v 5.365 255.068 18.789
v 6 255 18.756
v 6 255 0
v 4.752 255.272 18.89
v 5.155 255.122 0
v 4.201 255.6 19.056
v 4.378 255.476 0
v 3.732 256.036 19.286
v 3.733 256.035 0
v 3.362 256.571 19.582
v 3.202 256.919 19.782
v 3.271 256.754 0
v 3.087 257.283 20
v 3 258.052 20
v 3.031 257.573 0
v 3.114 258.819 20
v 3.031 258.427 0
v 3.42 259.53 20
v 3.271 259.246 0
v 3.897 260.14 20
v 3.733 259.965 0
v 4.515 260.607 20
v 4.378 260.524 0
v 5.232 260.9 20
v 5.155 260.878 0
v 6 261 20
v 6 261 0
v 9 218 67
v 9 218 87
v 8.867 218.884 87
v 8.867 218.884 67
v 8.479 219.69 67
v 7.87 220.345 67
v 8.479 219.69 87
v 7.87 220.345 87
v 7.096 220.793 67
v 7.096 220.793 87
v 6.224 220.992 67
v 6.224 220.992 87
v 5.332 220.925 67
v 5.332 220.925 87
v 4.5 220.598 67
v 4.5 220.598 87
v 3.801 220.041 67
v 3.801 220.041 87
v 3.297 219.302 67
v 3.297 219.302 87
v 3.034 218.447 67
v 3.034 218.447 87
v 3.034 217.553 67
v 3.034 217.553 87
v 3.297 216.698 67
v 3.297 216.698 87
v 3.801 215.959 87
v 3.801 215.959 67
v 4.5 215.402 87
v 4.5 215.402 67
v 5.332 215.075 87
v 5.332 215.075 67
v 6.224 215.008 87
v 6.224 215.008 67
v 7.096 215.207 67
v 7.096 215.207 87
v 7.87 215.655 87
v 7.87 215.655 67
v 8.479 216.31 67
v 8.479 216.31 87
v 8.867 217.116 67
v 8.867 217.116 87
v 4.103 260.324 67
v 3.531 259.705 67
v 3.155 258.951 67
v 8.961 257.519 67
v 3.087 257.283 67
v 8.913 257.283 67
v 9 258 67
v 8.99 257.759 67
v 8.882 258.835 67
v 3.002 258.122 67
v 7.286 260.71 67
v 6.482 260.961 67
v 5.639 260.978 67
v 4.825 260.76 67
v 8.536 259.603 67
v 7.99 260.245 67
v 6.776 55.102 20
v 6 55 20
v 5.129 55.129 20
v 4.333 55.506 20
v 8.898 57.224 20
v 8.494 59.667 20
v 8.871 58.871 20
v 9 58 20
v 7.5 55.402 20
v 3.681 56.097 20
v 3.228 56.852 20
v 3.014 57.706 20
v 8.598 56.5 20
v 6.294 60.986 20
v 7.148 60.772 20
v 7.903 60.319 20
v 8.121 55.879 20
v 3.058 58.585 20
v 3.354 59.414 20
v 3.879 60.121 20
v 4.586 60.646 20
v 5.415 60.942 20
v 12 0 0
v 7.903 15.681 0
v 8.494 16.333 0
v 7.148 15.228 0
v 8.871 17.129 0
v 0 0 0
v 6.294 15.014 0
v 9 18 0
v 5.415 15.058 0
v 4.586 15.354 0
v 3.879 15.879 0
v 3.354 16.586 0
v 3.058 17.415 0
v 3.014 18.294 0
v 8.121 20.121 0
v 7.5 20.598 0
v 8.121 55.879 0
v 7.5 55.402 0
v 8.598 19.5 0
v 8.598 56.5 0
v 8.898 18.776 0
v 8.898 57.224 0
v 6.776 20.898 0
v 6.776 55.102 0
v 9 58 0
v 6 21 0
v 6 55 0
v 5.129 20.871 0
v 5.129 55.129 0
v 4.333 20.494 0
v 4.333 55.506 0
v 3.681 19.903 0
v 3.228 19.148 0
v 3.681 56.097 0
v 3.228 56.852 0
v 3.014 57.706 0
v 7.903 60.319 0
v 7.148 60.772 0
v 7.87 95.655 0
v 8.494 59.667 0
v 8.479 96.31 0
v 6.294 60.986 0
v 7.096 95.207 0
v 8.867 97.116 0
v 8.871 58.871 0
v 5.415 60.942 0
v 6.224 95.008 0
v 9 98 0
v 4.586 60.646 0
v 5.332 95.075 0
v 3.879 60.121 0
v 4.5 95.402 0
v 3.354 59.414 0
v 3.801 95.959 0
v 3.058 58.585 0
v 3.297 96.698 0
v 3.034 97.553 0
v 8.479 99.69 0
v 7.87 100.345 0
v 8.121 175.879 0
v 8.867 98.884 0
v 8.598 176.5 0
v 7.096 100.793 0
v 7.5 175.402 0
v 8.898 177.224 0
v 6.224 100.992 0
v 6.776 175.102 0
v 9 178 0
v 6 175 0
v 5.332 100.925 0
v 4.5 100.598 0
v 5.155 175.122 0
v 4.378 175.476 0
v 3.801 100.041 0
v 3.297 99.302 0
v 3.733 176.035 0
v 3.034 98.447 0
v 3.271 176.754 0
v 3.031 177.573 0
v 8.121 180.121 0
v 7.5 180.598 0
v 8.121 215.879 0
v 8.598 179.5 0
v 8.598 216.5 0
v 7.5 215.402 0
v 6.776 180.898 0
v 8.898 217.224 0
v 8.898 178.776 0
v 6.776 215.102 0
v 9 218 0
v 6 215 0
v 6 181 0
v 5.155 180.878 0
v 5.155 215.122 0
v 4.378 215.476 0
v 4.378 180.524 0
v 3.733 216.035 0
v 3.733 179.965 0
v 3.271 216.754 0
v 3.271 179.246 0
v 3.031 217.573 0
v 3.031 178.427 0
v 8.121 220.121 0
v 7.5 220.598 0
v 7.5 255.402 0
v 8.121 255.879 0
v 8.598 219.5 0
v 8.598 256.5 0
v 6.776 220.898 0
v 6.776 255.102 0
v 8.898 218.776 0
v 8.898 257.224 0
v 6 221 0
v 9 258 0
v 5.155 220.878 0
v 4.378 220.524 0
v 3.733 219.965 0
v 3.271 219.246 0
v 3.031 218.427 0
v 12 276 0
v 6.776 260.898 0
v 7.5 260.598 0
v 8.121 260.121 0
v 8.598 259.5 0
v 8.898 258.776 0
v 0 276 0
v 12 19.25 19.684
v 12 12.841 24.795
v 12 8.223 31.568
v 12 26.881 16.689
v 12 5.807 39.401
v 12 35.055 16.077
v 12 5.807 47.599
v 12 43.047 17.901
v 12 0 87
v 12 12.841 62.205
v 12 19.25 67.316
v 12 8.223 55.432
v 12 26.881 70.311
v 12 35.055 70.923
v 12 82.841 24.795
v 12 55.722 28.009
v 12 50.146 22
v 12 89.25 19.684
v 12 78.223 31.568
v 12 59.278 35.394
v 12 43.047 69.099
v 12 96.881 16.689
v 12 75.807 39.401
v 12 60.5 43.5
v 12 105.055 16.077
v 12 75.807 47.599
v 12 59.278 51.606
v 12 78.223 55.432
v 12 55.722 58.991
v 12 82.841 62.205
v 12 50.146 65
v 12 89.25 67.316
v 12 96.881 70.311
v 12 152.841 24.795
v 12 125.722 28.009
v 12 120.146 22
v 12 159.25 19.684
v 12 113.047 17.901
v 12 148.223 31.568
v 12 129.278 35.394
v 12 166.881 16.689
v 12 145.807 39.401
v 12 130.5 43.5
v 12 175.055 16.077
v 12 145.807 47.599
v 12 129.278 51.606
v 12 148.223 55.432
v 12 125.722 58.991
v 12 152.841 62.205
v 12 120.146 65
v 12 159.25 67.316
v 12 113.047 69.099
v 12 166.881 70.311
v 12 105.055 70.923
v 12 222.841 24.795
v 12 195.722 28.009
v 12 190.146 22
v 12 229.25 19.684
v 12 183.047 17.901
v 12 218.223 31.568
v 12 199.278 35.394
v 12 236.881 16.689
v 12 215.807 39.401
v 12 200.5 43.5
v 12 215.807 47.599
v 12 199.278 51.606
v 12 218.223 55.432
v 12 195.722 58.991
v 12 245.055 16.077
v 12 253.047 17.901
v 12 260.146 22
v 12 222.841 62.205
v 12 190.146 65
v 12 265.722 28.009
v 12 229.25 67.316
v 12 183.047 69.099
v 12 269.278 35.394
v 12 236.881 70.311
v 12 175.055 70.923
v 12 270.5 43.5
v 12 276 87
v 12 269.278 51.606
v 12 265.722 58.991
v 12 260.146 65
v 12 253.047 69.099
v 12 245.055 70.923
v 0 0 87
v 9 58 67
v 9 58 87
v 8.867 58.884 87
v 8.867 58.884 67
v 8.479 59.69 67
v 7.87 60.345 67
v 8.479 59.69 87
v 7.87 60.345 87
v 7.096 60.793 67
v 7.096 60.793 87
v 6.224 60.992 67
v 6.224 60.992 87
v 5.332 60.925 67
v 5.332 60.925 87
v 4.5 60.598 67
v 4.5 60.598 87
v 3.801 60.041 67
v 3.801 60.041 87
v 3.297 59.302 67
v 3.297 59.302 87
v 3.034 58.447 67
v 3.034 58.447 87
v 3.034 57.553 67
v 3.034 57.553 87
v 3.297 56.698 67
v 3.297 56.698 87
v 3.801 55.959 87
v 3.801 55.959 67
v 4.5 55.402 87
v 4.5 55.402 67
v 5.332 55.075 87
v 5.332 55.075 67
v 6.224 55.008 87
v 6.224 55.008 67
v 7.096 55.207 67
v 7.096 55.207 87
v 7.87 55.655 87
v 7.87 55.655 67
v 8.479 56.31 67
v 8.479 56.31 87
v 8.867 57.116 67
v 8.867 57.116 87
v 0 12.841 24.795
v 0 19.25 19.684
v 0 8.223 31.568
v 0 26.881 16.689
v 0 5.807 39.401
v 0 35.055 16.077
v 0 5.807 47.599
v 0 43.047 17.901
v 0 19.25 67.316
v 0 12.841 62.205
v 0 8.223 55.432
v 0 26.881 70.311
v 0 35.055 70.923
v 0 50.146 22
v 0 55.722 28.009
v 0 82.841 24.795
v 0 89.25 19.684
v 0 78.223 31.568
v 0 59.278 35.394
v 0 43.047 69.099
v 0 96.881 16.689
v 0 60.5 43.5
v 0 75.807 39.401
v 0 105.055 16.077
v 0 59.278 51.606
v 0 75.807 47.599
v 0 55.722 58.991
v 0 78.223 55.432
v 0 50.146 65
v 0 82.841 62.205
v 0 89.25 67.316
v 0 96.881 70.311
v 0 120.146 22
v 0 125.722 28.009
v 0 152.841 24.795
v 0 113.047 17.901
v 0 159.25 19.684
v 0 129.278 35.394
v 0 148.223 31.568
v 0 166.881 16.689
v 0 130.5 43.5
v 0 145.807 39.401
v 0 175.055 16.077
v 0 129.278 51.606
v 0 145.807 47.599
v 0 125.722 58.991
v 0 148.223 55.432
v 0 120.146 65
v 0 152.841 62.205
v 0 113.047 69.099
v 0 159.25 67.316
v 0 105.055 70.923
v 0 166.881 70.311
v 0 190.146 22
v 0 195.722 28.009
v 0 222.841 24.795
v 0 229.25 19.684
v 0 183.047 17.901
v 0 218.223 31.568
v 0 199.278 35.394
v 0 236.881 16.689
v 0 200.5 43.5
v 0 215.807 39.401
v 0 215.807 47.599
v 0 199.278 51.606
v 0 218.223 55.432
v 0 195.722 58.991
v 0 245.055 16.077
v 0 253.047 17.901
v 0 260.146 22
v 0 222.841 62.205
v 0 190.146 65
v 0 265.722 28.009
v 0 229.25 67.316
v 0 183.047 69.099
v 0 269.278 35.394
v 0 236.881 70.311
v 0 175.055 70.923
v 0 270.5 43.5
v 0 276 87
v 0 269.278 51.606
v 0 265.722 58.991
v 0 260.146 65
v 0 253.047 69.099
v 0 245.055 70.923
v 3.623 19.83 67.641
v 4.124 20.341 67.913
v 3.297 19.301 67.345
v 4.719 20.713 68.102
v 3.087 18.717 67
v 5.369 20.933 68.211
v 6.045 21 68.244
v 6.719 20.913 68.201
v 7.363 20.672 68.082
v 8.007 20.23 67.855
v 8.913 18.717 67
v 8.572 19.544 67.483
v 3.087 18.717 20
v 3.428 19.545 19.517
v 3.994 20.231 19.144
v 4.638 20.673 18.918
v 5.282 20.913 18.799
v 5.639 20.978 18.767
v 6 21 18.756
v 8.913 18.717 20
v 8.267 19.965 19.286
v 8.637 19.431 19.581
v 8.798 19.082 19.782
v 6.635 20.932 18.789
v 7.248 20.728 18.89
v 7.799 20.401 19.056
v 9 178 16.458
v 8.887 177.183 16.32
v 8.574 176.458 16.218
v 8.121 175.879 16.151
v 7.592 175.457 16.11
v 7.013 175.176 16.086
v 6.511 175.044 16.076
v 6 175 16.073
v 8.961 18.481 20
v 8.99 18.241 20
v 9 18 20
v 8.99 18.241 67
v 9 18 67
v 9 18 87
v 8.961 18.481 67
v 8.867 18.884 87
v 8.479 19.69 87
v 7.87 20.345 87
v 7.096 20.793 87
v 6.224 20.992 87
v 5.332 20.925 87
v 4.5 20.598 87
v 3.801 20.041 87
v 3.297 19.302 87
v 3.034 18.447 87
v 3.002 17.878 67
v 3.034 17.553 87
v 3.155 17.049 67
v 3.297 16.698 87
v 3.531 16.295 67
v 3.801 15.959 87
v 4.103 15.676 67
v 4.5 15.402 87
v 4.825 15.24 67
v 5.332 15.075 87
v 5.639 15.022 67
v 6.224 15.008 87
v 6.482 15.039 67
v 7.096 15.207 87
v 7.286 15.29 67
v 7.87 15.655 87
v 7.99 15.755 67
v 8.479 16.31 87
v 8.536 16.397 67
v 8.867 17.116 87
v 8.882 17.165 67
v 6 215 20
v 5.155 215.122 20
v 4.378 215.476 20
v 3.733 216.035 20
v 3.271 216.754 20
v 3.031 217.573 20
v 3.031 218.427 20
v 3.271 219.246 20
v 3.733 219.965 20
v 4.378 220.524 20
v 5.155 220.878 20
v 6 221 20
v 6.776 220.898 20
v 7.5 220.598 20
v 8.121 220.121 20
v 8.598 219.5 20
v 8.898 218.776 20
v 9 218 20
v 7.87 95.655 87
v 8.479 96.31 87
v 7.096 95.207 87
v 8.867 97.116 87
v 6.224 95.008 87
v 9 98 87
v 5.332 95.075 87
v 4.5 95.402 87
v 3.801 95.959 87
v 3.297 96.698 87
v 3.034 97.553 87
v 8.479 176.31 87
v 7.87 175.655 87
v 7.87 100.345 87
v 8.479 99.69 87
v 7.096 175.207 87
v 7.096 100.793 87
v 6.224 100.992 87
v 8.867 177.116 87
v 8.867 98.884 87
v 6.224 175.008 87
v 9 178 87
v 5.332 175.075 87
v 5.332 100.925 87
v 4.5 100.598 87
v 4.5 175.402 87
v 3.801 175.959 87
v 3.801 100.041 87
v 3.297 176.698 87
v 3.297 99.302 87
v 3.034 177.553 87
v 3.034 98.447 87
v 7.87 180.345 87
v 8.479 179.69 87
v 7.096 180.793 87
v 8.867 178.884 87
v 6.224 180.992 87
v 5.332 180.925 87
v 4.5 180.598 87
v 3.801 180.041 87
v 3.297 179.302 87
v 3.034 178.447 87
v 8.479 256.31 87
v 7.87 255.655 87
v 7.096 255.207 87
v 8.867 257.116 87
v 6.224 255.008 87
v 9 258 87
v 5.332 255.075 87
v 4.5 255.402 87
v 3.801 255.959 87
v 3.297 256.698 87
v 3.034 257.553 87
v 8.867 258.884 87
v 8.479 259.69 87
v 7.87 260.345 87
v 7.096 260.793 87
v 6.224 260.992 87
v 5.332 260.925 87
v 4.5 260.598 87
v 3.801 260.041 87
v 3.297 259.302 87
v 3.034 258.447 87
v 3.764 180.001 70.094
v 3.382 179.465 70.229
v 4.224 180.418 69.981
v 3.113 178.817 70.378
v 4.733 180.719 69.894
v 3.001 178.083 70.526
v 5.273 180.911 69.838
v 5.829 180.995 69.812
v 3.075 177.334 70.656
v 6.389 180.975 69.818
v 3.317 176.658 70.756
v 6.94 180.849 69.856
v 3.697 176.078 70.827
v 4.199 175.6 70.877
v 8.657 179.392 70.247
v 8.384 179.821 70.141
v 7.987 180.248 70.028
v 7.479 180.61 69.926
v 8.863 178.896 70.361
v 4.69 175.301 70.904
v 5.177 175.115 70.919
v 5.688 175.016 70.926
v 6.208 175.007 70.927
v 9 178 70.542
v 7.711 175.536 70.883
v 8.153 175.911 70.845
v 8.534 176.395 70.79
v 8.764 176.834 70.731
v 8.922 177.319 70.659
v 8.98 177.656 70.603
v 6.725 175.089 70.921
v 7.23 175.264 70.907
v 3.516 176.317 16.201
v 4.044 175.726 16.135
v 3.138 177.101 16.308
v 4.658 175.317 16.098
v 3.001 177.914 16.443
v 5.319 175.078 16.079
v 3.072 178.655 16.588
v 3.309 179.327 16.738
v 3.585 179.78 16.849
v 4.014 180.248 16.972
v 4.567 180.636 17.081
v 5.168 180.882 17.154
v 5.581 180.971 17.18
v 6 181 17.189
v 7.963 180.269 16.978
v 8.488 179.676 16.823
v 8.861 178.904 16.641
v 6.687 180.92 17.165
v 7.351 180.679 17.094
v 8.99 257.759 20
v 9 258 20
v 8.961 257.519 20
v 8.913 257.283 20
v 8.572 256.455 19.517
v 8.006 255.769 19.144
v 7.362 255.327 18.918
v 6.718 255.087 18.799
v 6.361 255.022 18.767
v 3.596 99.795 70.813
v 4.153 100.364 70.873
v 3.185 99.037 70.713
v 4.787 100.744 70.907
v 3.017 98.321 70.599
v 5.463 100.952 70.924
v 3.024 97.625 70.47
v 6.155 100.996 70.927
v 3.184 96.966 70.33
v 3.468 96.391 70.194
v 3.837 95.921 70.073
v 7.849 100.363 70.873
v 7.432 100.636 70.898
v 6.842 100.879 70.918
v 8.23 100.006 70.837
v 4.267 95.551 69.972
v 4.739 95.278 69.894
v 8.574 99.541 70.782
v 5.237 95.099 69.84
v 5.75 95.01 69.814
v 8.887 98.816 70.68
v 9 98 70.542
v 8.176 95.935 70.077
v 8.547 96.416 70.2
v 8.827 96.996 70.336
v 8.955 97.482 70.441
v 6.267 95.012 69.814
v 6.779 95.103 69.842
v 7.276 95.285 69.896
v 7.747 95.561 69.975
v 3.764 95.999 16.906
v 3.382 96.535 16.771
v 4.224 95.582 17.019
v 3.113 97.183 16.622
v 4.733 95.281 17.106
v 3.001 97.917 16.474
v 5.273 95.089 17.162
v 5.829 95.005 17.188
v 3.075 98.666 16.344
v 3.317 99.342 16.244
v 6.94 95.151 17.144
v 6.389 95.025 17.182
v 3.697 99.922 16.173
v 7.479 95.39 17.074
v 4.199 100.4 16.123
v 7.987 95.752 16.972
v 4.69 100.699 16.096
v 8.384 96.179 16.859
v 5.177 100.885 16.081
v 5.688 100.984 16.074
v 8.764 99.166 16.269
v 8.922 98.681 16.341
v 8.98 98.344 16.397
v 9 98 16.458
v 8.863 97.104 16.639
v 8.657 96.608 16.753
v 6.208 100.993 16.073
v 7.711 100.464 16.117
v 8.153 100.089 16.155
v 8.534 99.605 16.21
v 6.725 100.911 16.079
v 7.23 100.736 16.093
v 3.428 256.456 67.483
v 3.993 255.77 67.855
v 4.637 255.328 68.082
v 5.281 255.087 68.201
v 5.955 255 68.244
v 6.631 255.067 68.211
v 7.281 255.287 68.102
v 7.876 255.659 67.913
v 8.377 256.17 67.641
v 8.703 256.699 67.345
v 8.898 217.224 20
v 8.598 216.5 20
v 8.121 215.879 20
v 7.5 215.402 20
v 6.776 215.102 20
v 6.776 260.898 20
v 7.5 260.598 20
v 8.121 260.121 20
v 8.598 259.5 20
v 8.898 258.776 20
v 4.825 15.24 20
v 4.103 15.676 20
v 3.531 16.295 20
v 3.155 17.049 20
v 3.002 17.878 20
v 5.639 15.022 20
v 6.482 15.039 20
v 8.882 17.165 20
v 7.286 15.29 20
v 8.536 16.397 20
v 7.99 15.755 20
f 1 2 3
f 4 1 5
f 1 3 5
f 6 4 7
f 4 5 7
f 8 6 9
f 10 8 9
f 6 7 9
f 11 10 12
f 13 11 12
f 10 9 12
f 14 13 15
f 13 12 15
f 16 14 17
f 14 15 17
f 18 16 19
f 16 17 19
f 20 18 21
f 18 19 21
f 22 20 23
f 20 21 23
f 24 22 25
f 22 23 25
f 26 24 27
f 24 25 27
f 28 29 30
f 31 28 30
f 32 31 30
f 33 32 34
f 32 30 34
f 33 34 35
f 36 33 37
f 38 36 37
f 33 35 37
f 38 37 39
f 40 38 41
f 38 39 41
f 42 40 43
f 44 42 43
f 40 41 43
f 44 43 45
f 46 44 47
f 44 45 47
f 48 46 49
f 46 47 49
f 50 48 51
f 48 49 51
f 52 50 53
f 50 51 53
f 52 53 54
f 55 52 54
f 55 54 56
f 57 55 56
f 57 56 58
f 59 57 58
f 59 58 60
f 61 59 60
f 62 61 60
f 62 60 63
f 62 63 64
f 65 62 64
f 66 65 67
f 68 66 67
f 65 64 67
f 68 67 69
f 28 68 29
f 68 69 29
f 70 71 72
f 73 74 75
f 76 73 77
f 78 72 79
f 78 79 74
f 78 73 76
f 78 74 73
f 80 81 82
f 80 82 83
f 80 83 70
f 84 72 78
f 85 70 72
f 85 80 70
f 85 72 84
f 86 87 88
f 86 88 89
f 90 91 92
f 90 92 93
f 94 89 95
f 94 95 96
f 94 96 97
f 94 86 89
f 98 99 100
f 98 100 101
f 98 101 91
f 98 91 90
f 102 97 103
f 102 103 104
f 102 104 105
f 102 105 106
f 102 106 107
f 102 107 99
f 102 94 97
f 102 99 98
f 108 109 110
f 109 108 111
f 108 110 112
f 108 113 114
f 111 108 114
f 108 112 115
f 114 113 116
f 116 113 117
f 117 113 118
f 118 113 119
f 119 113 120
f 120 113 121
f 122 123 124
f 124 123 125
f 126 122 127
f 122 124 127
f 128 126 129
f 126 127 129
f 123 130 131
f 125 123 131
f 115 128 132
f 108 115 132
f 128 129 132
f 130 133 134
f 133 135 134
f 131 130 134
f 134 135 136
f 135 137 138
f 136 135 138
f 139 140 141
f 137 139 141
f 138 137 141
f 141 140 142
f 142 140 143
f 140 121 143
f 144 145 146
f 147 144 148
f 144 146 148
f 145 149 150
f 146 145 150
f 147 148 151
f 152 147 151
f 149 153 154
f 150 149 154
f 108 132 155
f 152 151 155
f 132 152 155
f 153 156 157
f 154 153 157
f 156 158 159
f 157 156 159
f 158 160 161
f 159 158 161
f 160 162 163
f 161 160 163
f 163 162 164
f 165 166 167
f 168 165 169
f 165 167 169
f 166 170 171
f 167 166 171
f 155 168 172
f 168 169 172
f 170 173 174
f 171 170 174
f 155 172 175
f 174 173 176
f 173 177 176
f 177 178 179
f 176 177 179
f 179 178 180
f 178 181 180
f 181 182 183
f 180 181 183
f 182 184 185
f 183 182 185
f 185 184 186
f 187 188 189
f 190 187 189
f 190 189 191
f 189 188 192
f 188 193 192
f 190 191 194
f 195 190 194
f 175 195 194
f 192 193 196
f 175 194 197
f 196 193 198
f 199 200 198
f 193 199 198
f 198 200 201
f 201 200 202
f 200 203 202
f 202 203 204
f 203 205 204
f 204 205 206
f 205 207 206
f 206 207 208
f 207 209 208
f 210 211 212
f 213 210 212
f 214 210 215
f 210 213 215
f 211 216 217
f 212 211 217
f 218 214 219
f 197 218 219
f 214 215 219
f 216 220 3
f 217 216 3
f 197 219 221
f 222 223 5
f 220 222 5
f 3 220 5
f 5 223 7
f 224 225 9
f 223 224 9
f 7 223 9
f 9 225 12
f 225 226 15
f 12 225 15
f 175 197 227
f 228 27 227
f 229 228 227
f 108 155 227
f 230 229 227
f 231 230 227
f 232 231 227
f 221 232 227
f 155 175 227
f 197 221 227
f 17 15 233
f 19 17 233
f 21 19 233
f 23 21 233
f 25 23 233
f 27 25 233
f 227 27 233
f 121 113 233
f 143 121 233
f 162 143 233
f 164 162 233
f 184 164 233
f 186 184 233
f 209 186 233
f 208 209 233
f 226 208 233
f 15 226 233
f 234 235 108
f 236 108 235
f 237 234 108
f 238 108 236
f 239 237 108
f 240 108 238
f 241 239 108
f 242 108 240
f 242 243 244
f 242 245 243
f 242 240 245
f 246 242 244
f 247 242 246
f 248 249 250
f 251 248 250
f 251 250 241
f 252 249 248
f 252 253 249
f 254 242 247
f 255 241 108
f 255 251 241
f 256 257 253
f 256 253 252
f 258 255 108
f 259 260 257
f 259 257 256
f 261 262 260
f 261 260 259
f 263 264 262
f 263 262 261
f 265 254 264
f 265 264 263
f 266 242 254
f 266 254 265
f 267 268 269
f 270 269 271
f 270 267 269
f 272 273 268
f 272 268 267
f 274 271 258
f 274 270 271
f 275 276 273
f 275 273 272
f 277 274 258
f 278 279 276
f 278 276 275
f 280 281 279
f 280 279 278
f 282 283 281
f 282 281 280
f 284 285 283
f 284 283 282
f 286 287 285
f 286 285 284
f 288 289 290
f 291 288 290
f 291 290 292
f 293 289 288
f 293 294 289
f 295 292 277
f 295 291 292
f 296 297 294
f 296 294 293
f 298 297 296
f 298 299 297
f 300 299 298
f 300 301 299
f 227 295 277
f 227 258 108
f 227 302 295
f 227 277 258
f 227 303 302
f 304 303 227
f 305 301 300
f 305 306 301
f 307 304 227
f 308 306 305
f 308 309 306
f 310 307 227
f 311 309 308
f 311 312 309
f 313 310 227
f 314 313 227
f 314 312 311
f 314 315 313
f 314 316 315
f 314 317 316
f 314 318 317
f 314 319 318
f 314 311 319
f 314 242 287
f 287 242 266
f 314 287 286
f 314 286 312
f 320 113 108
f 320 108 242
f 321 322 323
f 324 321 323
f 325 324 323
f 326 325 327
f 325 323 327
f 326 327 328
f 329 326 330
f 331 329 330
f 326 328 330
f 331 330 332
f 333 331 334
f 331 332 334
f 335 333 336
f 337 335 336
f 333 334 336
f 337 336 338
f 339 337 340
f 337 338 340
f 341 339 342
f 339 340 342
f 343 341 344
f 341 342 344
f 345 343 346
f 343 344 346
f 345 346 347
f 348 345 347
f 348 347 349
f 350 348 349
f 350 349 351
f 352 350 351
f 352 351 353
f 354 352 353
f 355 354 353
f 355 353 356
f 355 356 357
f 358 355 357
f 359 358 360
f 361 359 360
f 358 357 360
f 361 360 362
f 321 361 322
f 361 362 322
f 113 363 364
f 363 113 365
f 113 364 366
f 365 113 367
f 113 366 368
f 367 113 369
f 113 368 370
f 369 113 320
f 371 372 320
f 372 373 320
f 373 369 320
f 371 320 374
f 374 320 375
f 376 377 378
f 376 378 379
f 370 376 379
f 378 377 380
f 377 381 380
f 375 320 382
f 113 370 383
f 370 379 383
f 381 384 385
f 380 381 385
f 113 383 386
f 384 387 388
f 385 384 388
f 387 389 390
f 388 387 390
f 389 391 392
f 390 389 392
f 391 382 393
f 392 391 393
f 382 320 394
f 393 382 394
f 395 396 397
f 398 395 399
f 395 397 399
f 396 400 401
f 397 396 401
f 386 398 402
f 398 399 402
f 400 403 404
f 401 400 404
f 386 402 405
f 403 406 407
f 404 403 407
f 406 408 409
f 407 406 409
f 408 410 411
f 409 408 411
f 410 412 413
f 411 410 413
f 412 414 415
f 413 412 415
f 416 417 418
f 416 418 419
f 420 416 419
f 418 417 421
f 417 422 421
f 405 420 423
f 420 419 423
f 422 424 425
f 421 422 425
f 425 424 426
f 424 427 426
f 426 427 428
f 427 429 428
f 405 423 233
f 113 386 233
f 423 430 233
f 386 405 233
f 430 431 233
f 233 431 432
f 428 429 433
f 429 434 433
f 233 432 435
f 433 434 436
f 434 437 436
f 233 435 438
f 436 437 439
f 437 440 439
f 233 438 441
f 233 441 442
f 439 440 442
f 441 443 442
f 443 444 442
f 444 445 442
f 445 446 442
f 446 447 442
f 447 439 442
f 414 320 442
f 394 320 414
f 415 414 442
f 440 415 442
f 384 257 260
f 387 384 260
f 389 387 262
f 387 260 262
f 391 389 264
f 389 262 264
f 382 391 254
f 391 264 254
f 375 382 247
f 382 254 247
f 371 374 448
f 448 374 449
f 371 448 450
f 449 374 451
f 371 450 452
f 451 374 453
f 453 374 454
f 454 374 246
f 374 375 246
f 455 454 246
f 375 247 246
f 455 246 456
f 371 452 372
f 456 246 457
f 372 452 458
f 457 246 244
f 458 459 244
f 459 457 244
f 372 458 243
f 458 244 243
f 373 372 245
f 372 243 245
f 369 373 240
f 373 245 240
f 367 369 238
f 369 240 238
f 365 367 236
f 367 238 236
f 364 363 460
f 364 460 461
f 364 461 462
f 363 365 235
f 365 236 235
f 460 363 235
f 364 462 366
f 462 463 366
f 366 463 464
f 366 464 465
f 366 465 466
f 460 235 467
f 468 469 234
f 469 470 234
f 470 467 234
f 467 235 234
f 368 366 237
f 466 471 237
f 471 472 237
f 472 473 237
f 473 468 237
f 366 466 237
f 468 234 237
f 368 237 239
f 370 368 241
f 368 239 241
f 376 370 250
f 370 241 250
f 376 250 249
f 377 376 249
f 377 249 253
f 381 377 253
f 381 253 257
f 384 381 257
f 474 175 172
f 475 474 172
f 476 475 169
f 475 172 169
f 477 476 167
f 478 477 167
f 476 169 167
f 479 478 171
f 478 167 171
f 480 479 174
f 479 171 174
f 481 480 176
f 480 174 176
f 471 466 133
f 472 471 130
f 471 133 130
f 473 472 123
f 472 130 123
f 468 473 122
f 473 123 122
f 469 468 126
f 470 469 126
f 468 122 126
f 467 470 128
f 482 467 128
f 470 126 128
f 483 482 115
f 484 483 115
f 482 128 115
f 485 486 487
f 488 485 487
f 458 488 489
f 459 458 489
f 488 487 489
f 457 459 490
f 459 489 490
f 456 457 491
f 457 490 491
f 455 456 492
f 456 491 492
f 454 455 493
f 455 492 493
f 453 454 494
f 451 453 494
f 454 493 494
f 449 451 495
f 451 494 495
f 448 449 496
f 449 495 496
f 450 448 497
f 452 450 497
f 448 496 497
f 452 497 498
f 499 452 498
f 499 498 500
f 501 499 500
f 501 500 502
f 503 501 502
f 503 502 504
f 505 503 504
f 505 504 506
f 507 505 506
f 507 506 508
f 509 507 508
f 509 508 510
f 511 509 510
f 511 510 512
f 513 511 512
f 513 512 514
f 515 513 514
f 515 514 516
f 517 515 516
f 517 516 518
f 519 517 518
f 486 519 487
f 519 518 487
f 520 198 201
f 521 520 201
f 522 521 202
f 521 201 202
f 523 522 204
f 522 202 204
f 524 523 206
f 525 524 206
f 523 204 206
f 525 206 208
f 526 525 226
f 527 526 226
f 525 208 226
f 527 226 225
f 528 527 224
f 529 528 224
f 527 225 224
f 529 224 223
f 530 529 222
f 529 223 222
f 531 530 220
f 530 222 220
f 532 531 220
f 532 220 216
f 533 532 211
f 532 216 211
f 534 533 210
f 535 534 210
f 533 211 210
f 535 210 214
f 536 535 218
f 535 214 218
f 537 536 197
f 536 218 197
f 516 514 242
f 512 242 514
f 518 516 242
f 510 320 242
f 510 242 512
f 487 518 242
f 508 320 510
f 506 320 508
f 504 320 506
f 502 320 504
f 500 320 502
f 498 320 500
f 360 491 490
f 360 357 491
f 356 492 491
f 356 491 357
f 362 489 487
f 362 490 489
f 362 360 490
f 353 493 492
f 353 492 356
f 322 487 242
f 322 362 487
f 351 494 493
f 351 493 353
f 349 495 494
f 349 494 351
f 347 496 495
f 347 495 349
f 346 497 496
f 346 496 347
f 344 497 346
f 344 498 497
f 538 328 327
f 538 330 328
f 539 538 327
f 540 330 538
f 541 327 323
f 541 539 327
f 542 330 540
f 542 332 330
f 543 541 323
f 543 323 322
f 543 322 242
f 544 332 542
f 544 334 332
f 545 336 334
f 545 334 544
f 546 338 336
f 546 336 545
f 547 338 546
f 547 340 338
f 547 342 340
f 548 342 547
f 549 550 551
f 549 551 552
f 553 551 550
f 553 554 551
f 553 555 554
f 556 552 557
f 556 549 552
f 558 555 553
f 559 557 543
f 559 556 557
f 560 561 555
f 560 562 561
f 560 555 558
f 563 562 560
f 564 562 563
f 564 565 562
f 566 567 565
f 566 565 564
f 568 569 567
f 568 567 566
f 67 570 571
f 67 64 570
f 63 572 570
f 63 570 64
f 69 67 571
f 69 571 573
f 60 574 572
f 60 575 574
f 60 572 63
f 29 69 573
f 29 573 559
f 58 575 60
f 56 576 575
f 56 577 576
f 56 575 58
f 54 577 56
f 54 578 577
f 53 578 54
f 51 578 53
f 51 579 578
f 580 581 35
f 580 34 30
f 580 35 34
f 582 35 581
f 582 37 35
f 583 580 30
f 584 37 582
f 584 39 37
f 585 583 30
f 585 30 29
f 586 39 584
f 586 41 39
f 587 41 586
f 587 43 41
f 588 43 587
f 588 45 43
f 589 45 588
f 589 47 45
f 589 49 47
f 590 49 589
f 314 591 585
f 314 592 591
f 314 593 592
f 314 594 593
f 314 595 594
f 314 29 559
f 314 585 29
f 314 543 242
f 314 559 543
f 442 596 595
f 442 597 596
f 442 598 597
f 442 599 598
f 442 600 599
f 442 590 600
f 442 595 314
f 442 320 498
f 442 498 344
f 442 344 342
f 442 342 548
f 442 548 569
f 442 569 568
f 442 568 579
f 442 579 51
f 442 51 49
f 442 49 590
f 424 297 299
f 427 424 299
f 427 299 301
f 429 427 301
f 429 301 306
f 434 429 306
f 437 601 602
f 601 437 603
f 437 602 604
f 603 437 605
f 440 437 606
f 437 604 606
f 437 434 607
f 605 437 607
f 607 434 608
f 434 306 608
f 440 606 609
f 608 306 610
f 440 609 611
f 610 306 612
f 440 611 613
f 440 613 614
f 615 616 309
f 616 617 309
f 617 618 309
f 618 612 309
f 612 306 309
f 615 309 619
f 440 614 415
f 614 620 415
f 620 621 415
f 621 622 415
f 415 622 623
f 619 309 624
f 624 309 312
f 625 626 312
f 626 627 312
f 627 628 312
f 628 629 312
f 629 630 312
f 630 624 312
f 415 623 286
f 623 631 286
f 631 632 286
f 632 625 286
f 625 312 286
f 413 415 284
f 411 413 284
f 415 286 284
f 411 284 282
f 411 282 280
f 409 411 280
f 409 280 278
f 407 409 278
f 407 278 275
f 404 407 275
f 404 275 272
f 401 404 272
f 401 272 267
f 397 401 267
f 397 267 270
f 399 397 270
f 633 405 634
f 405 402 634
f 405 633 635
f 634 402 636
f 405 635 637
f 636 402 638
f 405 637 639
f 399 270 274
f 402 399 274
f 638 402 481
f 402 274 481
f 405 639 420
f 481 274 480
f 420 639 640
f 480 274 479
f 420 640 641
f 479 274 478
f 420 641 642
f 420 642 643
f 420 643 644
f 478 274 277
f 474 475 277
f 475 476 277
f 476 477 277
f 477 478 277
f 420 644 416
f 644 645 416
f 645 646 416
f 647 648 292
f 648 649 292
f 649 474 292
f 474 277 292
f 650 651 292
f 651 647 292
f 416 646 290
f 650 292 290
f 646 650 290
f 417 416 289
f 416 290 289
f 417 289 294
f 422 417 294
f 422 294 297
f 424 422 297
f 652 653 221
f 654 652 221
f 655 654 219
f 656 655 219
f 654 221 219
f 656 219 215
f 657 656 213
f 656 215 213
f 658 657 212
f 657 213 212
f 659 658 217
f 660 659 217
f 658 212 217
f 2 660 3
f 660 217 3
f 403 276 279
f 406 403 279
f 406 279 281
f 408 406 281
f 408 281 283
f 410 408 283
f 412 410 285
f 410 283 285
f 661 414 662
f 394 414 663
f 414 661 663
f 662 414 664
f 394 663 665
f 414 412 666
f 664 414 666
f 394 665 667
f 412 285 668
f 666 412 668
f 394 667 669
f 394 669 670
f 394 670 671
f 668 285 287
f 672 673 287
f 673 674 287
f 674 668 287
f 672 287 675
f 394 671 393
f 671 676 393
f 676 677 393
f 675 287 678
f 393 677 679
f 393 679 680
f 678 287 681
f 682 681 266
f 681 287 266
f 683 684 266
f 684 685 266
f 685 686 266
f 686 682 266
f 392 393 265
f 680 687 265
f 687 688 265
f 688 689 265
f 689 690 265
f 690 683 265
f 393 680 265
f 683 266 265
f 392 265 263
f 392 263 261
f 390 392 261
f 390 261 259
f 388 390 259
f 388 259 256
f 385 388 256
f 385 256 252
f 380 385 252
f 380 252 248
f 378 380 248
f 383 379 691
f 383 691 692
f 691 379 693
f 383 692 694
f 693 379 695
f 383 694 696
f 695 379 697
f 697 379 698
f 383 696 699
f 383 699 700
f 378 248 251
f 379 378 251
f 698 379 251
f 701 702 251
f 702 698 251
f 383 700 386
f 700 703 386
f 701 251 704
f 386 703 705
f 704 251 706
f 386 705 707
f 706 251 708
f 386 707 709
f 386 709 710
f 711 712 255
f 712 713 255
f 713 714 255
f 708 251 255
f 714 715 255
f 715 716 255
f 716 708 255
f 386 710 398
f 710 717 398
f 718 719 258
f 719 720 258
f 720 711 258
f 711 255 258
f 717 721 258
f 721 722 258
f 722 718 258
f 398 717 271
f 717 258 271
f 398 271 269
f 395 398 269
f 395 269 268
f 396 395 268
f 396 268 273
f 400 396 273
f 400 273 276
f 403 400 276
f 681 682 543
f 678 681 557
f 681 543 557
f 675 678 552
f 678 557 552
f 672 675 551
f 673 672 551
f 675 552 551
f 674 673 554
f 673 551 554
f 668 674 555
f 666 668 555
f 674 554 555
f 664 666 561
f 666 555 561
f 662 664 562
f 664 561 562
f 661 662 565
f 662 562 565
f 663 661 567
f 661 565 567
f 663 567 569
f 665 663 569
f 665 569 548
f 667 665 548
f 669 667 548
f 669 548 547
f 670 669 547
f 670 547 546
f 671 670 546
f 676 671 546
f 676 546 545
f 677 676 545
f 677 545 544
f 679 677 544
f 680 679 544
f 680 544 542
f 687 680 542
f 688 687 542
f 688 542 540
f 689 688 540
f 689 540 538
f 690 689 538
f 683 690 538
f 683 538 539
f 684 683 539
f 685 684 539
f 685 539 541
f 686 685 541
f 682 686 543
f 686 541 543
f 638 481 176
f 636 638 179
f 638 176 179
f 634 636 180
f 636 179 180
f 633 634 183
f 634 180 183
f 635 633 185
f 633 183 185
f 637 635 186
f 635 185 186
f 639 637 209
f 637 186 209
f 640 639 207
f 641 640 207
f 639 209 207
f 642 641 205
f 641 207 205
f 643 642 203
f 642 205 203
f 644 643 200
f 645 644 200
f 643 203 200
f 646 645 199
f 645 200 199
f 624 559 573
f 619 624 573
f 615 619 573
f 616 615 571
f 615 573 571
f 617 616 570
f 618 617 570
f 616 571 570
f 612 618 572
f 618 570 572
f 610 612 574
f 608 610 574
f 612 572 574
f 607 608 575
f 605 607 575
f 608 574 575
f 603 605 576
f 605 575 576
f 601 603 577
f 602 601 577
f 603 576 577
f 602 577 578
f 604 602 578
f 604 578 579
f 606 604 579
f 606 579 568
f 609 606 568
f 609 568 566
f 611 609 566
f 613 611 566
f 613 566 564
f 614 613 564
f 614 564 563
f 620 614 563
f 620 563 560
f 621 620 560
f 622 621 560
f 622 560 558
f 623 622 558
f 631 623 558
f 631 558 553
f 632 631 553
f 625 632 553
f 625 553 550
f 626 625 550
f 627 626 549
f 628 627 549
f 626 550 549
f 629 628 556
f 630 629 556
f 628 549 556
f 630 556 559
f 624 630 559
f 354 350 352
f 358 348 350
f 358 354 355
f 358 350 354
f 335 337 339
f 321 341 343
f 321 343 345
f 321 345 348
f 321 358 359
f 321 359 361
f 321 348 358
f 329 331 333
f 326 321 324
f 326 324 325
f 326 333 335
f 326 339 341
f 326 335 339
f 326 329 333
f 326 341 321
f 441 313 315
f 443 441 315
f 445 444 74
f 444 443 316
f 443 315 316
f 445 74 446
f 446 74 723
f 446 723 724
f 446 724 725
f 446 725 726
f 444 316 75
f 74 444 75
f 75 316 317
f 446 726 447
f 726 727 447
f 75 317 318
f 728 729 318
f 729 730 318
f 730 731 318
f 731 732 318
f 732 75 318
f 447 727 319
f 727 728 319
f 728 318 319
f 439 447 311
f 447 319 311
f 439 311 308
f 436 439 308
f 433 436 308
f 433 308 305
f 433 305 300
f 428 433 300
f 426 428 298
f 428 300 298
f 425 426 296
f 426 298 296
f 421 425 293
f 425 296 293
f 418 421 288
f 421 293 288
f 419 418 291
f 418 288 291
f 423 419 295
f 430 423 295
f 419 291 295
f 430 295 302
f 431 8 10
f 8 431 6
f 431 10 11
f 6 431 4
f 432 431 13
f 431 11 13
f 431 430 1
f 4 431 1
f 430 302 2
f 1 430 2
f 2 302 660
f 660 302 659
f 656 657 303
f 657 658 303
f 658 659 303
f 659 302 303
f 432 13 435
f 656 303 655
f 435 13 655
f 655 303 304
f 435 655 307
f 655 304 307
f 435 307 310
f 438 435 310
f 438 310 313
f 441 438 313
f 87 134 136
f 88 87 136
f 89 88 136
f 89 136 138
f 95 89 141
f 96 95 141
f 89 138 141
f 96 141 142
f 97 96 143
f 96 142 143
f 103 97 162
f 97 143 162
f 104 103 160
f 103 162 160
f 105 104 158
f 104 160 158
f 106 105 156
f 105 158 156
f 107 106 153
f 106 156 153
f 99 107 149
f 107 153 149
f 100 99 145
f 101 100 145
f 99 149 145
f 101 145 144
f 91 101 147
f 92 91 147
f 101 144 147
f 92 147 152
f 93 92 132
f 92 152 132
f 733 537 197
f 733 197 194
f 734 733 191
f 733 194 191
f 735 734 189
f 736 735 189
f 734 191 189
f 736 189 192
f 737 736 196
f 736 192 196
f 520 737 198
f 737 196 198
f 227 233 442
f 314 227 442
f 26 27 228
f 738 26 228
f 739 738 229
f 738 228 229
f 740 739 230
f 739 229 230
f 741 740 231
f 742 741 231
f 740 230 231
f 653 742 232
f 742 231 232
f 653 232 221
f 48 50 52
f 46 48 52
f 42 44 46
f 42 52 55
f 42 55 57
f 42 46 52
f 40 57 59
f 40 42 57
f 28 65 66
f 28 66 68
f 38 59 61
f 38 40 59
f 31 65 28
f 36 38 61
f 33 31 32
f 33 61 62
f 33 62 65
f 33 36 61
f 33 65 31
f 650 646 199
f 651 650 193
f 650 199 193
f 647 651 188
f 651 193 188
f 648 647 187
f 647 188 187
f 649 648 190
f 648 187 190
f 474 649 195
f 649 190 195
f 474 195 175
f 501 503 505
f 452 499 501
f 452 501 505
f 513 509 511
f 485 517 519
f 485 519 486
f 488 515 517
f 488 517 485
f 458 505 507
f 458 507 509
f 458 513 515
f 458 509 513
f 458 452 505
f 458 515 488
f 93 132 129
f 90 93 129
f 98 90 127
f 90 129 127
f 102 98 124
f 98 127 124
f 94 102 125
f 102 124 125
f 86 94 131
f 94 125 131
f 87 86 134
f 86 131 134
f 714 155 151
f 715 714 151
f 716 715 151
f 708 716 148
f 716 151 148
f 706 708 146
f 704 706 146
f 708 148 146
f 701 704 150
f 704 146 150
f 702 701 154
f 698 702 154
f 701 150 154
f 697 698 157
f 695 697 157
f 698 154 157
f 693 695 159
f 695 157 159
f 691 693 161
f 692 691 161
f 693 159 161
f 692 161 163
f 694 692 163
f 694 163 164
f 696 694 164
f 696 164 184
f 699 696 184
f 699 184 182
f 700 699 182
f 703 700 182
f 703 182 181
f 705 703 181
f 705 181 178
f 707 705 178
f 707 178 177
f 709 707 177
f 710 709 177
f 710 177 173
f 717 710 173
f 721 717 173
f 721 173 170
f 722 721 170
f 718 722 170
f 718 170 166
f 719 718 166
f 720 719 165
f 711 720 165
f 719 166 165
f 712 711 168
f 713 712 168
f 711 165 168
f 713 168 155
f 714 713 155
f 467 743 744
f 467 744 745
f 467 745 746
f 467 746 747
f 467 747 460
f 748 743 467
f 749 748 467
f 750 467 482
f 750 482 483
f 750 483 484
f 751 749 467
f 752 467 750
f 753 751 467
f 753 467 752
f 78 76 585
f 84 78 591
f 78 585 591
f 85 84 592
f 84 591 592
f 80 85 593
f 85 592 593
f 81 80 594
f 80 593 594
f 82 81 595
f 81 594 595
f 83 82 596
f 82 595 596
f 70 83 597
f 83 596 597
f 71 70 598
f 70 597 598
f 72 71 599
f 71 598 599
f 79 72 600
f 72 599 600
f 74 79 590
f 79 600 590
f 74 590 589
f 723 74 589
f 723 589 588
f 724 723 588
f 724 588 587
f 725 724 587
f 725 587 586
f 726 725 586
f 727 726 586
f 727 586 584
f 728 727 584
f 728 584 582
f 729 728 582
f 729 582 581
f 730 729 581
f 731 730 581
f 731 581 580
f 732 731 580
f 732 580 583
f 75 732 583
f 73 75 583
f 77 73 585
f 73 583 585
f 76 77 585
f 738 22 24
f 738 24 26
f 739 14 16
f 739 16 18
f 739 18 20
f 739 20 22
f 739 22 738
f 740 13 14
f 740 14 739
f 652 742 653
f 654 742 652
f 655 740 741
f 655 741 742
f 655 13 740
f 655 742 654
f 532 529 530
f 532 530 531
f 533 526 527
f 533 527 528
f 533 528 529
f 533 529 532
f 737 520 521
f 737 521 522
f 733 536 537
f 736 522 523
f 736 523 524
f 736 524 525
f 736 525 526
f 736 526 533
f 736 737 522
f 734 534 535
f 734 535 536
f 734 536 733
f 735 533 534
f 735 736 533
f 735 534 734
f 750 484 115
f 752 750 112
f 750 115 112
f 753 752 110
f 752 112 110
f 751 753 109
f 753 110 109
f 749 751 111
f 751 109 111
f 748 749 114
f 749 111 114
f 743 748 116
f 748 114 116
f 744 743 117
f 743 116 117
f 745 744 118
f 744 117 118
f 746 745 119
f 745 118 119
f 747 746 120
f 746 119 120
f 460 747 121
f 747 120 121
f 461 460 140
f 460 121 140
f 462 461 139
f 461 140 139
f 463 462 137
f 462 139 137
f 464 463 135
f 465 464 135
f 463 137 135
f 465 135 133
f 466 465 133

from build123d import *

# Parameters (mm, degrees)
F0_W     = 276
F0_H     = 87
F1_DEPTH = 12
F2_R     = 27.5
F3_DEPTH = 25
F4_R     = 3
F5_DEPTH = 20
F6_R     = 3
F7_DEPTH = 20


with BuildPart() as f1:
    # F0 (on Right) → F1 (new body)
    with BuildSketch(Plane.YZ):
        with Locations((138, 43.5)):
            Rectangle(F0_W, F0_H)
    extrude(amount=F1_DEPTH)

    # F2 (on face) → F3 (cut)
    with BuildSketch(Plane.YZ.offset(12)):
        with Locations((103, 43.5)):
            Circle(F2_R)
        with Locations((173, 43.5)):
            Circle(F2_R)
        with Locations((33, 43.5)):
            Circle(F2_R)
        with Locations((243, 43.5)):
            Circle(F2_R)
    extrude(amount=-F3_DEPTH, mode=Mode.SUBTRACT)

    # F4 (on face) → F5 (cut)
    with BuildSketch(Plane.XY.offset(87)):
        with Locations((6, 258)):
            Circle(F4_R)
        with Locations((6, 218)):
            Circle(F4_R)
        with Locations((6, 178)):
            Circle(F4_R)
        with Locations((6, 18)):
            Circle(F4_R)
        with Locations((6, 58)):
            Circle(F4_R)
        with Locations((6, 98)):
            Circle(F4_R)
    extrude(amount=-F5_DEPTH, mode=Mode.SUBTRACT)

    # F6 (on face) → F7 (cut)
    with BuildSketch(Plane(origin=(0, 0, 0), x_dir=(1, 0, 0), z_dir=(0, 0, -1))):
        with BuildLine():
            ThreePointArc((6, -255), (3, -258), (6, -261))
            Line((6, -261), (6, -258))
            Line((6, -258), (6, -255))
        make_face()
        with BuildLine():
            ThreePointArc((6, -175), (3, -178), (6, -181))
            Line((6, -181), (6, -175))
        make_face()
        with BuildLine():
            Line((6, -175), (6, -181))
            ThreePointArc((6, -181), (8.12132, -180.12132), (9, -178))
            ThreePointArc((9, -178), (8.12132, -175.87868), (6, -175))
        make_face()
        with BuildLine():
            ThreePointArc((6, -215), (3, -218), (6, -221))
            Line((6, -221), (6, -218))
            Line((6, -218), (6, -215))
        make_face()
        with BuildLine():
            Line((6, -218), (6, -221))
            ThreePointArc((6, -221), (8.12132, -220.12132), (9, -218))
            ThreePointArc((9, -218), (8.12132, -215.87868), (6, -215))
            Line((6, -215), (6, -218))
        make_face()
        with BuildLine():
            Line((6, -258), (6, -261))
            ThreePointArc((6, -261), (8.12132, -260.12132), (9, -258))
            Line((9, -258), (6, -258))
        make_face()
        with BuildLine():
            Line((6, -255), (6, -258))
            Line((6, -258), (9, -258))
            ThreePointArc((9, -258), (8.12132, -255.87868), (6, -255))
        make_face()
        with BuildLine():
            Line((6, -18), (9, -18))
            ThreePointArc((9, -18), (3.87868, -15.87868), (6, -21))
            Line((6, -21), (6, -18))
        make_face()
        with BuildLine():
            ThreePointArc((9, -58), (8.12132, -55.87868), (6, -55))
            ThreePointArc((6, -55), (3.87868, -60.12132), (9, -58))
        make_face()
        with BuildLine():
            ThreePointArc((6, -21), (8.12132, -20.12132), (9, -18))
            Line((9, -18), (6, -18))
            Line((6, -18), (6, -21))
        make_face()
        with Locations((6, -98)):
            Circle(F6_R)
    extrude(amount=-F7_DEPTH, mode=Mode.SUBTRACT)


solid = f1.part
